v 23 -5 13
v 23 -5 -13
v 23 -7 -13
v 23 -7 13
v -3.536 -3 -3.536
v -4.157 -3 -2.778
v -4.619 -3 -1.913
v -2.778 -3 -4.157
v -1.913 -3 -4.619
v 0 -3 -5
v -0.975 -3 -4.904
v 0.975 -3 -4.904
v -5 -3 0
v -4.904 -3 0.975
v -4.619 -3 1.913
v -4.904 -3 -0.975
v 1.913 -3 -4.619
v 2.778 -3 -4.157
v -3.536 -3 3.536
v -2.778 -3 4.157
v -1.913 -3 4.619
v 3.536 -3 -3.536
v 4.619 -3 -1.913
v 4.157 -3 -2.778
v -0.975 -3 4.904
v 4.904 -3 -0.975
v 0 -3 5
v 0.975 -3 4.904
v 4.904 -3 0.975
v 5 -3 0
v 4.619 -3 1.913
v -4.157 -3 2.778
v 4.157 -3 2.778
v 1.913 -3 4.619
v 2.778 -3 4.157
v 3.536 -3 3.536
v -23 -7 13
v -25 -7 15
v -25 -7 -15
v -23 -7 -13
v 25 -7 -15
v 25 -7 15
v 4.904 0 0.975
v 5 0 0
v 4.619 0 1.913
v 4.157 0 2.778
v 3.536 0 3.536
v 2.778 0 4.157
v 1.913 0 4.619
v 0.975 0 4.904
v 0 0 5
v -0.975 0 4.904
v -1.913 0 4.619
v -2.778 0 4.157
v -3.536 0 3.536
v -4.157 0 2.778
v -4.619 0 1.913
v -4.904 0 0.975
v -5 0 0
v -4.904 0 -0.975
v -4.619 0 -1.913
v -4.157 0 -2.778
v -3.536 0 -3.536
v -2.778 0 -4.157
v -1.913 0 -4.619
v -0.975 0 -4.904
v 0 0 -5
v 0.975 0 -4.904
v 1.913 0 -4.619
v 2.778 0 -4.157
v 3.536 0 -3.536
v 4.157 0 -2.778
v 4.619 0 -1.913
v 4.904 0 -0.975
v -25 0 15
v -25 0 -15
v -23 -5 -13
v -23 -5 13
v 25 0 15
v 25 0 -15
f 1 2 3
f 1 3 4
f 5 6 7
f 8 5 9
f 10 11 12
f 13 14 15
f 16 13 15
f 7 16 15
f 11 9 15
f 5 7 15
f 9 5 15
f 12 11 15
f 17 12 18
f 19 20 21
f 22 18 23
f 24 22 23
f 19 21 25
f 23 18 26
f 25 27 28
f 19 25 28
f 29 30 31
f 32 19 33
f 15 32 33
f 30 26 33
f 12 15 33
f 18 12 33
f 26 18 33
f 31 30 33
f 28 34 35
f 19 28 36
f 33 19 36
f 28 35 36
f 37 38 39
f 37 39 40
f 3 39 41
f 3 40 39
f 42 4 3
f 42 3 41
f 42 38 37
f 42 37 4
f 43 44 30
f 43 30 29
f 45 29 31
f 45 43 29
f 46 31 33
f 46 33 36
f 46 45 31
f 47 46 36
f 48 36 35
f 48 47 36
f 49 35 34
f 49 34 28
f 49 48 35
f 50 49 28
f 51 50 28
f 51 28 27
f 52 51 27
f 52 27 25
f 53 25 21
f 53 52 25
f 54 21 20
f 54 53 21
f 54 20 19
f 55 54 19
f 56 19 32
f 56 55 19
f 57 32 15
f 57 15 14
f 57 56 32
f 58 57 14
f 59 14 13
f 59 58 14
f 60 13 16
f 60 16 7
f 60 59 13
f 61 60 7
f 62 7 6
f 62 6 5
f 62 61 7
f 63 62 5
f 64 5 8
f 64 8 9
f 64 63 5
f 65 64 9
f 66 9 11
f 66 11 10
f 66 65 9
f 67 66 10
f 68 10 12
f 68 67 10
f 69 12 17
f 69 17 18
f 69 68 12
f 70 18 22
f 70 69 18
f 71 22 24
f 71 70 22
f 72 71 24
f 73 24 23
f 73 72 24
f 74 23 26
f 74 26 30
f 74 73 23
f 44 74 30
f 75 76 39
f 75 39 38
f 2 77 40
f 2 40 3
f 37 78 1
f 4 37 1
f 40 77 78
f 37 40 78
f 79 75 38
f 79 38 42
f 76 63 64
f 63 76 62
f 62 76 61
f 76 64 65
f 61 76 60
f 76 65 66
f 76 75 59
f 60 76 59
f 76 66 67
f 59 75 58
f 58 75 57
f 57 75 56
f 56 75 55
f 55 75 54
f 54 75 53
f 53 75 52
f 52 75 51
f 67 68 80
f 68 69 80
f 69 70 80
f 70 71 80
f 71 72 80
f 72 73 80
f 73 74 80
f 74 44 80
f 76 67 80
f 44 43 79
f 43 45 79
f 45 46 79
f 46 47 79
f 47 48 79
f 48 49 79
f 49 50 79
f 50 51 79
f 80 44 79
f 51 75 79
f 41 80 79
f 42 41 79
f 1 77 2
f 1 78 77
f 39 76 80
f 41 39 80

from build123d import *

# Parameters (mm, degrees)
F0_W     = 50
F0_H     = 30
F0_W_2   = 46
F0_H_2   = 26
F0_R     = 8
F0_R_2   = 5
F1_DEPTH = 5
F2_DEPTH = 7
F3_DEPTH = 3.0000000261


with BuildPart() as f1:
    # F0 (on Front) → F1 (new body)
    with BuildSketch(Plane.XZ):
        Rectangle(F0_W, F0_H)
        Rectangle(F0_W_2, F0_H_2, mode=Mode.SUBTRACT)
        Rectangle(F0_W_2, F0_H_2)
        Circle(F0_R, mode=Mode.SUBTRACT)
        Circle(F0_R)
        Circle(F0_R_2, mode=Mode.SUBTRACT)
        Circle(F0_R_2)
    extrude(amount=F1_DEPTH)

    # F0 (on Front) → F2 (join)
    with BuildSketch(Plane.XZ):
        Rectangle(F0_W, F0_H)
        Rectangle(F0_W_2, F0_H_2, mode=Mode.SUBTRACT)
    extrude(amount=F2_DEPTH)

    # F0 (on Front) → F3 (cut)
    with BuildSketch(Plane.XZ):
        Circle(F0_R_2)
    extrude(amount=F3_DEPTH, mode=Mode.SUBTRACT)


solid = f1.part
